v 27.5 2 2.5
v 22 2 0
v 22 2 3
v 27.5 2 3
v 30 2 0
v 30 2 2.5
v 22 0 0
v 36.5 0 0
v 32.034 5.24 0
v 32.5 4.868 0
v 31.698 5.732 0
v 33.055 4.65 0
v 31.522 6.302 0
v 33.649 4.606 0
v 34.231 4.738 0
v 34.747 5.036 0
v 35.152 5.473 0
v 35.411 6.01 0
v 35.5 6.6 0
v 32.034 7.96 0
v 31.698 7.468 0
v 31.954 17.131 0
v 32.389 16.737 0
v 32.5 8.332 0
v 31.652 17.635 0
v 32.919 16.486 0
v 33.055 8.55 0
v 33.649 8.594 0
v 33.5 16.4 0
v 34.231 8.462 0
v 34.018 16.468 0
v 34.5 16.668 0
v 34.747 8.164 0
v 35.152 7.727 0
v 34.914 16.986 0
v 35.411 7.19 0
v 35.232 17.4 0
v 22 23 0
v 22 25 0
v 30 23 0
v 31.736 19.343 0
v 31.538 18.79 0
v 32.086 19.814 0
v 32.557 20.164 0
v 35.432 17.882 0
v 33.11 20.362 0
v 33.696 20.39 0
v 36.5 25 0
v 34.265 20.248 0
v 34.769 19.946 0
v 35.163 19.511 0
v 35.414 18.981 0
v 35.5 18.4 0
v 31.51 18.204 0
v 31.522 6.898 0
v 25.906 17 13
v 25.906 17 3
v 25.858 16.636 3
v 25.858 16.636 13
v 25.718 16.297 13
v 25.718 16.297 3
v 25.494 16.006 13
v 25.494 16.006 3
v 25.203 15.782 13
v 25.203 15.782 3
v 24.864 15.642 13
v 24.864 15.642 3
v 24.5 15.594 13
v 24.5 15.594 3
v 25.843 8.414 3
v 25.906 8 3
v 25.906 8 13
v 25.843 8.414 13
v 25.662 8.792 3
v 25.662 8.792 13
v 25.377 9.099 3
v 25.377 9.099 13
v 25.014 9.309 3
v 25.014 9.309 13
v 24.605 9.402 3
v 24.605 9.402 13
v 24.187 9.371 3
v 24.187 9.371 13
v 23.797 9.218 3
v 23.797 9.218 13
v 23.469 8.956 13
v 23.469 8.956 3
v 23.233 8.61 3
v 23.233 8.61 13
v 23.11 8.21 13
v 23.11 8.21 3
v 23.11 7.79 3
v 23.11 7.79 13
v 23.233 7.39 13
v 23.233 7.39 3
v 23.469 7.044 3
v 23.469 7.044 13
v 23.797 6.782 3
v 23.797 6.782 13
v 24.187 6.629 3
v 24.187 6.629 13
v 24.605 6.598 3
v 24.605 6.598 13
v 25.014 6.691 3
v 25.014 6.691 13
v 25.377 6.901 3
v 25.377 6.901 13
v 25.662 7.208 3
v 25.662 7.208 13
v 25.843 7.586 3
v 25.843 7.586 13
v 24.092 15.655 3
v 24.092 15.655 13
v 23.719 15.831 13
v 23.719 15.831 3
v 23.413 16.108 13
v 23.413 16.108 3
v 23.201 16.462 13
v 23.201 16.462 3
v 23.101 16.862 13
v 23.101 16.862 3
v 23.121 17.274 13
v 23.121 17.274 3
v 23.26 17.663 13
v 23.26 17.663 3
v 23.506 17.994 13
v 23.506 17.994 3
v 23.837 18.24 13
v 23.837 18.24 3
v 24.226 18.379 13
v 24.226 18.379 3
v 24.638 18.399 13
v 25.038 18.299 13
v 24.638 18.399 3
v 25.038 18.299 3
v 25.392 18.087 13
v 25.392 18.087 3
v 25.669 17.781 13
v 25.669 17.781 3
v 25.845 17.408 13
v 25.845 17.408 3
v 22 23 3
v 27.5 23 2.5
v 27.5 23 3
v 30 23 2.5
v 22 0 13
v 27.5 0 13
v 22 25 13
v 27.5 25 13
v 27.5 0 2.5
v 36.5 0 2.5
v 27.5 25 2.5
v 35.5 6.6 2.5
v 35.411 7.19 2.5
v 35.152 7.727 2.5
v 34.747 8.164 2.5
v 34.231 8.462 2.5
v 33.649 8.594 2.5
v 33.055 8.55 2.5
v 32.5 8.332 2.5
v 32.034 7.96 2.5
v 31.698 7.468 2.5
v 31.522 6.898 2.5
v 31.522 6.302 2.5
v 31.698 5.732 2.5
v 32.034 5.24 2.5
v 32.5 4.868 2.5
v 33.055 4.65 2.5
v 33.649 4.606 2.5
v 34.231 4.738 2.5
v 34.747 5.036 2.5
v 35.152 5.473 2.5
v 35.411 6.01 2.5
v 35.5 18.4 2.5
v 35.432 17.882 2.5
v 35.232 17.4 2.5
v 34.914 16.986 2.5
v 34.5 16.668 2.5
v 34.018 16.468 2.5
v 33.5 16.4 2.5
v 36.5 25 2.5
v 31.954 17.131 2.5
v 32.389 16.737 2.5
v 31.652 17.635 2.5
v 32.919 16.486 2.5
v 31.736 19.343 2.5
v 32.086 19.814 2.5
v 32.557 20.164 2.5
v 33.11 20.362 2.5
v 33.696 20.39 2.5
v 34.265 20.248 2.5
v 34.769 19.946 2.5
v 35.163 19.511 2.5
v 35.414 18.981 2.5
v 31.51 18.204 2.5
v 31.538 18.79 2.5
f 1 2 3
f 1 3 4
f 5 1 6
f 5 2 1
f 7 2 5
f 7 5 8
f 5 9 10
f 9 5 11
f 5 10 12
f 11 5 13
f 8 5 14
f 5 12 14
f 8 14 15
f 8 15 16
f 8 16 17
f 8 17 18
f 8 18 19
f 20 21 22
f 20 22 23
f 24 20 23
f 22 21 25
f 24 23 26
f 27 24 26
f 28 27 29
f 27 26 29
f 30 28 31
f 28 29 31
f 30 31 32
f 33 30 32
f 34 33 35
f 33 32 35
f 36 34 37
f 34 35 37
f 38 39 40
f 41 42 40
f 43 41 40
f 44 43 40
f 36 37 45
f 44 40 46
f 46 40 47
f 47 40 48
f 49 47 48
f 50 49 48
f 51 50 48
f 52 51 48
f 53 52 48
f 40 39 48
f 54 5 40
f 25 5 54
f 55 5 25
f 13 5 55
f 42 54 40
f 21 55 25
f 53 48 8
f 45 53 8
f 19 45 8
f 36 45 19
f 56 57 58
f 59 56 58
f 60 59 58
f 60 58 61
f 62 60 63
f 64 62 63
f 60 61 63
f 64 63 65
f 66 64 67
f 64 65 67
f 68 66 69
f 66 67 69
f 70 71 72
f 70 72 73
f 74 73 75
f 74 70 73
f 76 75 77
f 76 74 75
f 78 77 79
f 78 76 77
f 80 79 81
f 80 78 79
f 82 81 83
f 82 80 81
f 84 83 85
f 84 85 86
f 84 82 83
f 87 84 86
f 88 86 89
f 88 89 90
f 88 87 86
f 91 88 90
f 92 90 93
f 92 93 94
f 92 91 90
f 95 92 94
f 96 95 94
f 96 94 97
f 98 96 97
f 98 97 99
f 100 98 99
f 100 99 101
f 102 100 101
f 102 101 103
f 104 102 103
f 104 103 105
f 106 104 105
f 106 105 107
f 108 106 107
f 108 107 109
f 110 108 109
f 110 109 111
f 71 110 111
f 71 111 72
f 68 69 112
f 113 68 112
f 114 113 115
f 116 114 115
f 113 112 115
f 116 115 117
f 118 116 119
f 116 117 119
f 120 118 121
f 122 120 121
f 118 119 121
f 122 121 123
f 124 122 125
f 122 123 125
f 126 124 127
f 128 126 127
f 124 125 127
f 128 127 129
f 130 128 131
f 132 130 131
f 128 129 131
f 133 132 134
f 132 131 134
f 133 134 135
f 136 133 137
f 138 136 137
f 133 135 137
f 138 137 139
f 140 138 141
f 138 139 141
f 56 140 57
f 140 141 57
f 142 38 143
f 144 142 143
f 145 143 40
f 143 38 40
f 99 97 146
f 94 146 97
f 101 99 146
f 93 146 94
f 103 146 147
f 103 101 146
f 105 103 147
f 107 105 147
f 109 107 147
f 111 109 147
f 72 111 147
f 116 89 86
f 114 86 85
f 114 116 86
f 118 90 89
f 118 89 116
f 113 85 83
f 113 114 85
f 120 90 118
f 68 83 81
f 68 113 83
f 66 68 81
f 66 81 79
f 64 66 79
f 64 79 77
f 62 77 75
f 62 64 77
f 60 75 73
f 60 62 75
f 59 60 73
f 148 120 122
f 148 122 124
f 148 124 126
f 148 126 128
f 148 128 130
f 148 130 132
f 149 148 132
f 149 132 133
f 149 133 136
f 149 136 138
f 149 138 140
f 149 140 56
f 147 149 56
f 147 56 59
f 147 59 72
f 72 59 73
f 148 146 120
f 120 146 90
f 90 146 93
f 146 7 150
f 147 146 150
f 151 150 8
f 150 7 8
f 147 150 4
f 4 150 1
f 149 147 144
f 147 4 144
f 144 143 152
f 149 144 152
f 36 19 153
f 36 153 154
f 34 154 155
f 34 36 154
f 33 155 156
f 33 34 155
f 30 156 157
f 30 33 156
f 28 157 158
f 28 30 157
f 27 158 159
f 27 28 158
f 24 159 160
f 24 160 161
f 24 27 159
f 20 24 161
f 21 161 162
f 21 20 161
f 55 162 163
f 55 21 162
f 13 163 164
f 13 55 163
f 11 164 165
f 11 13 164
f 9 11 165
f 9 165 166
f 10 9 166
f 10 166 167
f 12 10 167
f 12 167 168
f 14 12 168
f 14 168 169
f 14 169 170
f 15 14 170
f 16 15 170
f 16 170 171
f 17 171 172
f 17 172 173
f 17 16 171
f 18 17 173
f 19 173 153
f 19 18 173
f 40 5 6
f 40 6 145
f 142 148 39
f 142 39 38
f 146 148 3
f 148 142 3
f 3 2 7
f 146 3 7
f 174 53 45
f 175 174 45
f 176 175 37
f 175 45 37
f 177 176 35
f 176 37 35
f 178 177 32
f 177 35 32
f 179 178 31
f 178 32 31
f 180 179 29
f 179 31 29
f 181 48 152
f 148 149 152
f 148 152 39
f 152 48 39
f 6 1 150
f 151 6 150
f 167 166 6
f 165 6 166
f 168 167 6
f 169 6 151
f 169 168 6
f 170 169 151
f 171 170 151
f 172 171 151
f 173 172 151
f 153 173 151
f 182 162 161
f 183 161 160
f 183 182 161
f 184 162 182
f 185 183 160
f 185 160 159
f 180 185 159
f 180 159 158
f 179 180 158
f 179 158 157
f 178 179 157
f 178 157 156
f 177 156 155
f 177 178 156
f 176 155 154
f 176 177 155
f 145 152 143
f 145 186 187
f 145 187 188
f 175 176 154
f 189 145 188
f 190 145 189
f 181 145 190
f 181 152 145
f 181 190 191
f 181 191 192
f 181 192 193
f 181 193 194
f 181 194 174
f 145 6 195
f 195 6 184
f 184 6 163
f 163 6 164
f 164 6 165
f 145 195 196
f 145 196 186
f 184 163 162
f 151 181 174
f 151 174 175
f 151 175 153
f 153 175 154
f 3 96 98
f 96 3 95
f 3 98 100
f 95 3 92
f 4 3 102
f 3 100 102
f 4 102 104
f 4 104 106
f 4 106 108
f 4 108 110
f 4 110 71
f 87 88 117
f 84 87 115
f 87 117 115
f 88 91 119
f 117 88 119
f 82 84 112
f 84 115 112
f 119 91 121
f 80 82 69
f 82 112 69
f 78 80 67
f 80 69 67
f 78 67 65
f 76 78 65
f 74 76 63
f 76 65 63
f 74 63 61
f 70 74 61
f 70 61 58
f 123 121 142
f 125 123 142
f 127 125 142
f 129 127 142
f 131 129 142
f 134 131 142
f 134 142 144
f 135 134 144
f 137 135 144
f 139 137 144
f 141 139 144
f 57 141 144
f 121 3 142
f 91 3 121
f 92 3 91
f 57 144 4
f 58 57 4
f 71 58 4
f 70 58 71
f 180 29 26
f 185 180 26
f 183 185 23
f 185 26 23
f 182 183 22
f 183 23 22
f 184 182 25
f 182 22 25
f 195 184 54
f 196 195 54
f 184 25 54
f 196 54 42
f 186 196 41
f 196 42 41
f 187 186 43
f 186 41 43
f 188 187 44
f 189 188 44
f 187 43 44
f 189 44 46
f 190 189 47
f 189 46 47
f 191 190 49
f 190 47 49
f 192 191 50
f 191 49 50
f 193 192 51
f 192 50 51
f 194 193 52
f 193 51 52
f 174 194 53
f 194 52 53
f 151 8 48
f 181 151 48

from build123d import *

# Parameters (mm, degrees)
F0_R     = 2
F1_DEPTH = 2.5
F2_R     = 1.405868
F3_DEPTH = 13
F4_W     = 8.5
F4_H     = 21
F5_DEPTH = 3


with BuildPart() as f1:
    # F0 (on Top) → F1 (new body)
    with BuildSketch(Plane.XY):
        with BuildLine():
            ThreePointArc((35.5, 18.4), (32.085786, 19.814214), (33.5, 16.4))
            ThreePointArc((33.5, 16.4), (34.914214, 16.985786), (35.5, 18.4))
        make_face()
        Polygon((26, 12.5), (26, 0), (36.5, 0), (36.5, 25), (26, 25), align=None)
        with Locations((33.5, 6.6)):
            Circle(F0_R, mode=Mode.SUBTRACT)
        with BuildLine():
            ThreePointArc((35.5, 18.4), (34.914214, 16.985786), (33.5, 16.4))
            ThreePointArc((33.5, 16.4), (32.085786, 19.814214), (35.5, 18.4))
        make_face(mode=Mode.SUBTRACT)
    extrude(amount=F1_DEPTH)

    # F2 (on Top) → F3 (join)
    with BuildSketch(Plane.XY):
        with BuildLine():
            ThreePointArc((25.905868, 17), (23.505901, 17.994099), (24.5, 15.594132))
            ThreePointArc((24.5, 15.594132), (25.494099, 16.005901), (25.905868, 17))
        make_face()
        Polygon((22, 12.5), (22, 0), (27.5, 0), (27.5, 25), (22, 25), align=None)
        with Locations((24.5, 8)):
            Circle(F2_R, mode=Mode.SUBTRACT)
        with BuildLine():
            ThreePointArc((25.905868, 17), (25.494099, 16.005901), (24.5, 15.594132))
            ThreePointArc((24.5, 15.594132), (23.505901, 17.994099), (25.905868, 17))
        make_face(mode=Mode.SUBTRACT)
    extrude(amount=F3_DEPTH)

    # F4 (on Top) → F5 (cut)
    with BuildSketch(Plane.XY):
        with Locations((25.75, 12.5)):
            Rectangle(F4_W, F4_H)
    extrude(amount=F5_DEPTH, mode=Mode.SUBTRACT)


solid = f1.part
